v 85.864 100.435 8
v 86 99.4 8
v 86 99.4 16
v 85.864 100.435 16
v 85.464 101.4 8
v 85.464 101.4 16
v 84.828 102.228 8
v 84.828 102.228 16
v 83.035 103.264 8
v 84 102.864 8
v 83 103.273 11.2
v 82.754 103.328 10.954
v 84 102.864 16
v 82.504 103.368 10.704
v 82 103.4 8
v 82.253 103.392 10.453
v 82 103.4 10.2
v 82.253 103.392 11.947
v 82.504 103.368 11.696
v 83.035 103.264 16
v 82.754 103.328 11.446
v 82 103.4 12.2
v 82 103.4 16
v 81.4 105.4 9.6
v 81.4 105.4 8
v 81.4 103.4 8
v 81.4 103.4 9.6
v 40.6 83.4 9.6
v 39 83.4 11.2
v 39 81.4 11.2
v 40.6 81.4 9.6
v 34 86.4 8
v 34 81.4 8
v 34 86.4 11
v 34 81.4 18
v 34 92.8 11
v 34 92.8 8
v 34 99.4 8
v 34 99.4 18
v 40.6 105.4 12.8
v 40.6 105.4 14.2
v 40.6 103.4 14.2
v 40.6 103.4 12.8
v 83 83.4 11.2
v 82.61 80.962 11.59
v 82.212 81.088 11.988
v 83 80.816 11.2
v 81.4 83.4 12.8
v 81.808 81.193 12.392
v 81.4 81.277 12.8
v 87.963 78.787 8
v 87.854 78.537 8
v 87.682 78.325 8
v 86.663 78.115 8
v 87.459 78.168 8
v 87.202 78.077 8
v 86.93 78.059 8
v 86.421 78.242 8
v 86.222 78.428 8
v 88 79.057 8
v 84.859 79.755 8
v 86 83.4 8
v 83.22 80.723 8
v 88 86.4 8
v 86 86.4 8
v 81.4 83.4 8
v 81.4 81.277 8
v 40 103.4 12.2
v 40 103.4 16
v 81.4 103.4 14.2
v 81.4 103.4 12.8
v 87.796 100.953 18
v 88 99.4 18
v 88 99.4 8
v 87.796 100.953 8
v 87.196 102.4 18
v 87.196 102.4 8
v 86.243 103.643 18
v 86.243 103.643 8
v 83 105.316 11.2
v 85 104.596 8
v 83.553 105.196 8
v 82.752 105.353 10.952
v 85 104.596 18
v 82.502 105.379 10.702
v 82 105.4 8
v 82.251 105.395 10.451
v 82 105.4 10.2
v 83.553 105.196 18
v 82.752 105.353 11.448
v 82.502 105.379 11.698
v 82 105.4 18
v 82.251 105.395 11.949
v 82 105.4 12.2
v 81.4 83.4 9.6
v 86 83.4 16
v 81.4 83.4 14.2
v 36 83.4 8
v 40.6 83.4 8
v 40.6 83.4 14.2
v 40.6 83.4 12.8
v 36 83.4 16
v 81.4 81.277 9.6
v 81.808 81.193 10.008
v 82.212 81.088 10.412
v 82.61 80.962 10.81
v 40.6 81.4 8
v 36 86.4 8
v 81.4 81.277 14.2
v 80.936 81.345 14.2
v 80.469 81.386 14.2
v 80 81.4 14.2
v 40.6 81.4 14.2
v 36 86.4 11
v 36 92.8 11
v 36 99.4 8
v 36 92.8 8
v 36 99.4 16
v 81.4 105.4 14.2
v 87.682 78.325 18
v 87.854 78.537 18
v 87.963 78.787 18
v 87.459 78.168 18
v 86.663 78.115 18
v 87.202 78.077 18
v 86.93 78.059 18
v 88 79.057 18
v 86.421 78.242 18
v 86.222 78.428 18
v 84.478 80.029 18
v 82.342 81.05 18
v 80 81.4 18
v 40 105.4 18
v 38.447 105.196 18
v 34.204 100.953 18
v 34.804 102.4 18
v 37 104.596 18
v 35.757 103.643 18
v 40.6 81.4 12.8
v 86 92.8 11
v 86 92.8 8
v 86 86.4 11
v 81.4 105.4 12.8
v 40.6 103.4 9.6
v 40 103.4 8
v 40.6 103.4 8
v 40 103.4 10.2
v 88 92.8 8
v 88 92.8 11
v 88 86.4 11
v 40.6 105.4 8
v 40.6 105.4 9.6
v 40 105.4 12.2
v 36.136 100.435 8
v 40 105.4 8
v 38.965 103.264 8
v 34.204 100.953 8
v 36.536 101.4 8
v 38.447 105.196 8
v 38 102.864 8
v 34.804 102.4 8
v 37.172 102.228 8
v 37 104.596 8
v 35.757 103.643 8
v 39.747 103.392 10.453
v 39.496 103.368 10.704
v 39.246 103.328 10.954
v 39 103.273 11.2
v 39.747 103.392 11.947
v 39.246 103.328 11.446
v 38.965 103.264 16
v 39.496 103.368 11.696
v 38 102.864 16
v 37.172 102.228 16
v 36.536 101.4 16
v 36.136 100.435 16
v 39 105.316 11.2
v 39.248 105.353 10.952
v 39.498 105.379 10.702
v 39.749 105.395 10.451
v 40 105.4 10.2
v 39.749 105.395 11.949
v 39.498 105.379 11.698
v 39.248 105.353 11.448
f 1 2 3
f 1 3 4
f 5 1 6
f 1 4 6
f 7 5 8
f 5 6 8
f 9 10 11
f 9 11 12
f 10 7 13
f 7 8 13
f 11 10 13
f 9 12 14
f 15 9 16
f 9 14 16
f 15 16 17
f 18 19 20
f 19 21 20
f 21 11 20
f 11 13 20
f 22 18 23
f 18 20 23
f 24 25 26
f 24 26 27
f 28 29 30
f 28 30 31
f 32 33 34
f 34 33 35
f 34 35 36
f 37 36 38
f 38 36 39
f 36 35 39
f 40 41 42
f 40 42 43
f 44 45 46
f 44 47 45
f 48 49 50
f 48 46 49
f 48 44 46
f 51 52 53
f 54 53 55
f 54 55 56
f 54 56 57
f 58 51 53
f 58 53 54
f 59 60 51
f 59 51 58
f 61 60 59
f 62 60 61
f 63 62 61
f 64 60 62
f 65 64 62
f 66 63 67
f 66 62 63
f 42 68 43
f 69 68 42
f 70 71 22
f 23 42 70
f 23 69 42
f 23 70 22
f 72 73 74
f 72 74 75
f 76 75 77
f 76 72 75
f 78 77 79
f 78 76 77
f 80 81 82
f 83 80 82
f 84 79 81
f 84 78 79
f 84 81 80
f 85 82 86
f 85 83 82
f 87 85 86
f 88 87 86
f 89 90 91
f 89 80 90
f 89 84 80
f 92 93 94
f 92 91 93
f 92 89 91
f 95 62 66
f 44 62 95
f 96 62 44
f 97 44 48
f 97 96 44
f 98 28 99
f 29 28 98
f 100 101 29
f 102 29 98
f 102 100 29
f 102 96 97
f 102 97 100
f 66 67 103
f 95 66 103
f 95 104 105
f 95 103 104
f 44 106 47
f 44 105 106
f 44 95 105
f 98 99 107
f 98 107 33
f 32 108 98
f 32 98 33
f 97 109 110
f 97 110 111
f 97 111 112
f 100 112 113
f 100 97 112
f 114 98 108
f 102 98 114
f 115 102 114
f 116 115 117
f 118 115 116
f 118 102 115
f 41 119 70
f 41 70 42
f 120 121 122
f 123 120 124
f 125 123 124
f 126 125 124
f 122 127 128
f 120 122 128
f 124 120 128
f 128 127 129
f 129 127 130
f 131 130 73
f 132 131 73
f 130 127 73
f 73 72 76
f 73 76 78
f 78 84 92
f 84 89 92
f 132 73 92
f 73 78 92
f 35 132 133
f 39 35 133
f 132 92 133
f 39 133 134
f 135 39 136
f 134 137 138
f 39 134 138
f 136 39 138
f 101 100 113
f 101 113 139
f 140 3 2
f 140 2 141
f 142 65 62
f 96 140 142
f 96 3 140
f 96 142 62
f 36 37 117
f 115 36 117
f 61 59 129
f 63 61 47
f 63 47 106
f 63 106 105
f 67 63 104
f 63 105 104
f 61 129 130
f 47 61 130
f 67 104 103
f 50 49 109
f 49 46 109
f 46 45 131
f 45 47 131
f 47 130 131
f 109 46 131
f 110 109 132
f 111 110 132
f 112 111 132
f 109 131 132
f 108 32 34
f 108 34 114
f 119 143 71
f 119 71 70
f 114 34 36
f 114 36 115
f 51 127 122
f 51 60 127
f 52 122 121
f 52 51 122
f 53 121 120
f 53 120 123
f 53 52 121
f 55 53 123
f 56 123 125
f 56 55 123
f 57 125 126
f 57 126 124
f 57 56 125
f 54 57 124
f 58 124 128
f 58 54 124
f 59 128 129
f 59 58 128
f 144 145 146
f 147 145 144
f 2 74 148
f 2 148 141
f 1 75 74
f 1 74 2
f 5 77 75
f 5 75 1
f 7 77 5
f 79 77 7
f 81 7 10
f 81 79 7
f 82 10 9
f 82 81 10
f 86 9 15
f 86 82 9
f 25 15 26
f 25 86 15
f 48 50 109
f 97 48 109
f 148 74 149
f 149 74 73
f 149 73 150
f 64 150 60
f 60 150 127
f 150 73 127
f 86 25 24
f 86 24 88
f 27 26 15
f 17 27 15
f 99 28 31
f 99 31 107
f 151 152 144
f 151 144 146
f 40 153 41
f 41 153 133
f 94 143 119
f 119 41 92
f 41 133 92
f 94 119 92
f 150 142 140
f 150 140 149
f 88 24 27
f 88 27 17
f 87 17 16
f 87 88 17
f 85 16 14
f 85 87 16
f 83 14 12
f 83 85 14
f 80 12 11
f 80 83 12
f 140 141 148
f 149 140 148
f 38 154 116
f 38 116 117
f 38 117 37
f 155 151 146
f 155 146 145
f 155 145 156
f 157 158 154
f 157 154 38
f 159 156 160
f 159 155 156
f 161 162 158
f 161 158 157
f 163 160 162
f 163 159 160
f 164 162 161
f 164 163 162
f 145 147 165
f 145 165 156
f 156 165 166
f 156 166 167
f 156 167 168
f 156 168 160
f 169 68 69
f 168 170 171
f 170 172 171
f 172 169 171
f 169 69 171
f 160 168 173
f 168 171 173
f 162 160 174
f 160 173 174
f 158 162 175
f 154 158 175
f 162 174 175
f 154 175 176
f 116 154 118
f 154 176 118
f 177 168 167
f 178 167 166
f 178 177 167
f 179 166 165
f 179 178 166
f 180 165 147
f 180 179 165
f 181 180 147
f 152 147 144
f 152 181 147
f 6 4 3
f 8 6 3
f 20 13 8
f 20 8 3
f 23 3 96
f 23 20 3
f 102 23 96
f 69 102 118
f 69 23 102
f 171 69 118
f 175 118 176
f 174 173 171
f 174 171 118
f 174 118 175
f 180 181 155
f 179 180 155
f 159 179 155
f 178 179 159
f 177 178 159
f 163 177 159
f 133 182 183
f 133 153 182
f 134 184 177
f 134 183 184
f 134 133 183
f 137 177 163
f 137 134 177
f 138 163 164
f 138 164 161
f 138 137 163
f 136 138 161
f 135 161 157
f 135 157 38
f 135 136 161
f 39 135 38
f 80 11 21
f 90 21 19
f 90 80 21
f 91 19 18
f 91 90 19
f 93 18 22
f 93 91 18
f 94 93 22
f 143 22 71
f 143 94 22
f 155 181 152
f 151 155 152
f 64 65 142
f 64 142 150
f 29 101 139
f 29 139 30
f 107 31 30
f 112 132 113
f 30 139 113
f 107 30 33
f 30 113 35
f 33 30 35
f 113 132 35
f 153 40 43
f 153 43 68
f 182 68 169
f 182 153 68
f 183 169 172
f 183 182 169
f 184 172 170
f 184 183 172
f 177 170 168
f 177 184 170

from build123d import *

# Parameters (mm, degrees)
PAD019_DEPTH    = 10
POCKET027_DEPTH = 8
FILLET005_R     = 1
POCKET028_DEPTH = 27.344146
SKETCH089_W     = 2
SKETCH089_H     = 6.4
POCKET031_DEPTH = 3


with BuildPart() as part:
    # Sketch085 (on DatumPlane) → Pad019 (new body)
    with BuildSketch(Plane.XY.offset(18)):
        with BuildLine():
            Line((40, 105.4), (82, 105.4))
            ThreePointArc((88, 99.4), (86.242641, 103.642641), (82, 105.4))
            Line((88, 99.4), (88, 73.4))
            ThreePointArc((88, 73.4), (85.656854, 79.056854), (80, 81.4))
            Line((80, 81.4), (34, 81.4))
            Line((34, 81.4), (34, 99.4))
            ThreePointArc((40, 105.4), (35.757359, 103.642641), (34, 99.4))
        make_face()
    extrude(amount=-PAD019_DEPTH)

    # Sketch083 (on Face8 of Pad019) → Pocket027 (cut)
    with BuildSketch(Plane.XY.offset(16)):
        with BuildLine():
            Line((40, 103.4), (82, 103.4))
            ThreePointArc((86, 99.4), (84.828427, 102.228427), (82, 103.4))
            Line((86, 99.4), (86, 83.4))
            Line((86, 83.4), (36, 83.4))
            Line((36, 83.4), (36, 99.4))
            ThreePointArc((40, 103.4), (37.171573, 102.228427), (36, 99.4))
        make_face()
    extrude(amount=-POCKET027_DEPTH, mode=Mode.SUBTRACT)

    # Fillet005
    fillet005_edges = [part.edges().sort_by_distance(p)[0] for p in [
        (88, 73.4, 13),
    ]]
    fillet(fillet005_edges, radius=FILLET005_R)

    # Sketch086 (on DatumPlane) → Pocket028 (cut, through all)
    with BuildSketch(Plane(origin=(0, 105.4, 18), x_dir=(-1, 0, 0), z_dir=(0, 1, 0))):
        Polygon((-81.4, -3.8), (-40.6, -3.8), (-40.6, -5.2), (-39, -6.8), (-40.6, -8.4), (-40.6, -10), (-81.4, -10), (-81.4, -8.4), (-83, -6.8), (-81.4, -5.2), align=None)
    extrude(amount=-POCKET028_DEPTH, mode=Mode.SUBTRACT)

    # Sketch089 (on DatumPlane) → Pocket031 (cut)
    with BuildSketch(Plane(origin=(0, 0, 8), x_dir=(1, 0, 0), z_dir=(0, 0, -1))):
        with Locations((35, -89.6)):
            Rectangle(SKETCH089_W, SKETCH089_H)
        with Locations((87, -89.6)):
            Rectangle(SKETCH089_W, SKETCH089_H)
    extrude(amount=-POCKET031_DEPTH, mode=Mode.SUBTRACT)


solid = part.part
